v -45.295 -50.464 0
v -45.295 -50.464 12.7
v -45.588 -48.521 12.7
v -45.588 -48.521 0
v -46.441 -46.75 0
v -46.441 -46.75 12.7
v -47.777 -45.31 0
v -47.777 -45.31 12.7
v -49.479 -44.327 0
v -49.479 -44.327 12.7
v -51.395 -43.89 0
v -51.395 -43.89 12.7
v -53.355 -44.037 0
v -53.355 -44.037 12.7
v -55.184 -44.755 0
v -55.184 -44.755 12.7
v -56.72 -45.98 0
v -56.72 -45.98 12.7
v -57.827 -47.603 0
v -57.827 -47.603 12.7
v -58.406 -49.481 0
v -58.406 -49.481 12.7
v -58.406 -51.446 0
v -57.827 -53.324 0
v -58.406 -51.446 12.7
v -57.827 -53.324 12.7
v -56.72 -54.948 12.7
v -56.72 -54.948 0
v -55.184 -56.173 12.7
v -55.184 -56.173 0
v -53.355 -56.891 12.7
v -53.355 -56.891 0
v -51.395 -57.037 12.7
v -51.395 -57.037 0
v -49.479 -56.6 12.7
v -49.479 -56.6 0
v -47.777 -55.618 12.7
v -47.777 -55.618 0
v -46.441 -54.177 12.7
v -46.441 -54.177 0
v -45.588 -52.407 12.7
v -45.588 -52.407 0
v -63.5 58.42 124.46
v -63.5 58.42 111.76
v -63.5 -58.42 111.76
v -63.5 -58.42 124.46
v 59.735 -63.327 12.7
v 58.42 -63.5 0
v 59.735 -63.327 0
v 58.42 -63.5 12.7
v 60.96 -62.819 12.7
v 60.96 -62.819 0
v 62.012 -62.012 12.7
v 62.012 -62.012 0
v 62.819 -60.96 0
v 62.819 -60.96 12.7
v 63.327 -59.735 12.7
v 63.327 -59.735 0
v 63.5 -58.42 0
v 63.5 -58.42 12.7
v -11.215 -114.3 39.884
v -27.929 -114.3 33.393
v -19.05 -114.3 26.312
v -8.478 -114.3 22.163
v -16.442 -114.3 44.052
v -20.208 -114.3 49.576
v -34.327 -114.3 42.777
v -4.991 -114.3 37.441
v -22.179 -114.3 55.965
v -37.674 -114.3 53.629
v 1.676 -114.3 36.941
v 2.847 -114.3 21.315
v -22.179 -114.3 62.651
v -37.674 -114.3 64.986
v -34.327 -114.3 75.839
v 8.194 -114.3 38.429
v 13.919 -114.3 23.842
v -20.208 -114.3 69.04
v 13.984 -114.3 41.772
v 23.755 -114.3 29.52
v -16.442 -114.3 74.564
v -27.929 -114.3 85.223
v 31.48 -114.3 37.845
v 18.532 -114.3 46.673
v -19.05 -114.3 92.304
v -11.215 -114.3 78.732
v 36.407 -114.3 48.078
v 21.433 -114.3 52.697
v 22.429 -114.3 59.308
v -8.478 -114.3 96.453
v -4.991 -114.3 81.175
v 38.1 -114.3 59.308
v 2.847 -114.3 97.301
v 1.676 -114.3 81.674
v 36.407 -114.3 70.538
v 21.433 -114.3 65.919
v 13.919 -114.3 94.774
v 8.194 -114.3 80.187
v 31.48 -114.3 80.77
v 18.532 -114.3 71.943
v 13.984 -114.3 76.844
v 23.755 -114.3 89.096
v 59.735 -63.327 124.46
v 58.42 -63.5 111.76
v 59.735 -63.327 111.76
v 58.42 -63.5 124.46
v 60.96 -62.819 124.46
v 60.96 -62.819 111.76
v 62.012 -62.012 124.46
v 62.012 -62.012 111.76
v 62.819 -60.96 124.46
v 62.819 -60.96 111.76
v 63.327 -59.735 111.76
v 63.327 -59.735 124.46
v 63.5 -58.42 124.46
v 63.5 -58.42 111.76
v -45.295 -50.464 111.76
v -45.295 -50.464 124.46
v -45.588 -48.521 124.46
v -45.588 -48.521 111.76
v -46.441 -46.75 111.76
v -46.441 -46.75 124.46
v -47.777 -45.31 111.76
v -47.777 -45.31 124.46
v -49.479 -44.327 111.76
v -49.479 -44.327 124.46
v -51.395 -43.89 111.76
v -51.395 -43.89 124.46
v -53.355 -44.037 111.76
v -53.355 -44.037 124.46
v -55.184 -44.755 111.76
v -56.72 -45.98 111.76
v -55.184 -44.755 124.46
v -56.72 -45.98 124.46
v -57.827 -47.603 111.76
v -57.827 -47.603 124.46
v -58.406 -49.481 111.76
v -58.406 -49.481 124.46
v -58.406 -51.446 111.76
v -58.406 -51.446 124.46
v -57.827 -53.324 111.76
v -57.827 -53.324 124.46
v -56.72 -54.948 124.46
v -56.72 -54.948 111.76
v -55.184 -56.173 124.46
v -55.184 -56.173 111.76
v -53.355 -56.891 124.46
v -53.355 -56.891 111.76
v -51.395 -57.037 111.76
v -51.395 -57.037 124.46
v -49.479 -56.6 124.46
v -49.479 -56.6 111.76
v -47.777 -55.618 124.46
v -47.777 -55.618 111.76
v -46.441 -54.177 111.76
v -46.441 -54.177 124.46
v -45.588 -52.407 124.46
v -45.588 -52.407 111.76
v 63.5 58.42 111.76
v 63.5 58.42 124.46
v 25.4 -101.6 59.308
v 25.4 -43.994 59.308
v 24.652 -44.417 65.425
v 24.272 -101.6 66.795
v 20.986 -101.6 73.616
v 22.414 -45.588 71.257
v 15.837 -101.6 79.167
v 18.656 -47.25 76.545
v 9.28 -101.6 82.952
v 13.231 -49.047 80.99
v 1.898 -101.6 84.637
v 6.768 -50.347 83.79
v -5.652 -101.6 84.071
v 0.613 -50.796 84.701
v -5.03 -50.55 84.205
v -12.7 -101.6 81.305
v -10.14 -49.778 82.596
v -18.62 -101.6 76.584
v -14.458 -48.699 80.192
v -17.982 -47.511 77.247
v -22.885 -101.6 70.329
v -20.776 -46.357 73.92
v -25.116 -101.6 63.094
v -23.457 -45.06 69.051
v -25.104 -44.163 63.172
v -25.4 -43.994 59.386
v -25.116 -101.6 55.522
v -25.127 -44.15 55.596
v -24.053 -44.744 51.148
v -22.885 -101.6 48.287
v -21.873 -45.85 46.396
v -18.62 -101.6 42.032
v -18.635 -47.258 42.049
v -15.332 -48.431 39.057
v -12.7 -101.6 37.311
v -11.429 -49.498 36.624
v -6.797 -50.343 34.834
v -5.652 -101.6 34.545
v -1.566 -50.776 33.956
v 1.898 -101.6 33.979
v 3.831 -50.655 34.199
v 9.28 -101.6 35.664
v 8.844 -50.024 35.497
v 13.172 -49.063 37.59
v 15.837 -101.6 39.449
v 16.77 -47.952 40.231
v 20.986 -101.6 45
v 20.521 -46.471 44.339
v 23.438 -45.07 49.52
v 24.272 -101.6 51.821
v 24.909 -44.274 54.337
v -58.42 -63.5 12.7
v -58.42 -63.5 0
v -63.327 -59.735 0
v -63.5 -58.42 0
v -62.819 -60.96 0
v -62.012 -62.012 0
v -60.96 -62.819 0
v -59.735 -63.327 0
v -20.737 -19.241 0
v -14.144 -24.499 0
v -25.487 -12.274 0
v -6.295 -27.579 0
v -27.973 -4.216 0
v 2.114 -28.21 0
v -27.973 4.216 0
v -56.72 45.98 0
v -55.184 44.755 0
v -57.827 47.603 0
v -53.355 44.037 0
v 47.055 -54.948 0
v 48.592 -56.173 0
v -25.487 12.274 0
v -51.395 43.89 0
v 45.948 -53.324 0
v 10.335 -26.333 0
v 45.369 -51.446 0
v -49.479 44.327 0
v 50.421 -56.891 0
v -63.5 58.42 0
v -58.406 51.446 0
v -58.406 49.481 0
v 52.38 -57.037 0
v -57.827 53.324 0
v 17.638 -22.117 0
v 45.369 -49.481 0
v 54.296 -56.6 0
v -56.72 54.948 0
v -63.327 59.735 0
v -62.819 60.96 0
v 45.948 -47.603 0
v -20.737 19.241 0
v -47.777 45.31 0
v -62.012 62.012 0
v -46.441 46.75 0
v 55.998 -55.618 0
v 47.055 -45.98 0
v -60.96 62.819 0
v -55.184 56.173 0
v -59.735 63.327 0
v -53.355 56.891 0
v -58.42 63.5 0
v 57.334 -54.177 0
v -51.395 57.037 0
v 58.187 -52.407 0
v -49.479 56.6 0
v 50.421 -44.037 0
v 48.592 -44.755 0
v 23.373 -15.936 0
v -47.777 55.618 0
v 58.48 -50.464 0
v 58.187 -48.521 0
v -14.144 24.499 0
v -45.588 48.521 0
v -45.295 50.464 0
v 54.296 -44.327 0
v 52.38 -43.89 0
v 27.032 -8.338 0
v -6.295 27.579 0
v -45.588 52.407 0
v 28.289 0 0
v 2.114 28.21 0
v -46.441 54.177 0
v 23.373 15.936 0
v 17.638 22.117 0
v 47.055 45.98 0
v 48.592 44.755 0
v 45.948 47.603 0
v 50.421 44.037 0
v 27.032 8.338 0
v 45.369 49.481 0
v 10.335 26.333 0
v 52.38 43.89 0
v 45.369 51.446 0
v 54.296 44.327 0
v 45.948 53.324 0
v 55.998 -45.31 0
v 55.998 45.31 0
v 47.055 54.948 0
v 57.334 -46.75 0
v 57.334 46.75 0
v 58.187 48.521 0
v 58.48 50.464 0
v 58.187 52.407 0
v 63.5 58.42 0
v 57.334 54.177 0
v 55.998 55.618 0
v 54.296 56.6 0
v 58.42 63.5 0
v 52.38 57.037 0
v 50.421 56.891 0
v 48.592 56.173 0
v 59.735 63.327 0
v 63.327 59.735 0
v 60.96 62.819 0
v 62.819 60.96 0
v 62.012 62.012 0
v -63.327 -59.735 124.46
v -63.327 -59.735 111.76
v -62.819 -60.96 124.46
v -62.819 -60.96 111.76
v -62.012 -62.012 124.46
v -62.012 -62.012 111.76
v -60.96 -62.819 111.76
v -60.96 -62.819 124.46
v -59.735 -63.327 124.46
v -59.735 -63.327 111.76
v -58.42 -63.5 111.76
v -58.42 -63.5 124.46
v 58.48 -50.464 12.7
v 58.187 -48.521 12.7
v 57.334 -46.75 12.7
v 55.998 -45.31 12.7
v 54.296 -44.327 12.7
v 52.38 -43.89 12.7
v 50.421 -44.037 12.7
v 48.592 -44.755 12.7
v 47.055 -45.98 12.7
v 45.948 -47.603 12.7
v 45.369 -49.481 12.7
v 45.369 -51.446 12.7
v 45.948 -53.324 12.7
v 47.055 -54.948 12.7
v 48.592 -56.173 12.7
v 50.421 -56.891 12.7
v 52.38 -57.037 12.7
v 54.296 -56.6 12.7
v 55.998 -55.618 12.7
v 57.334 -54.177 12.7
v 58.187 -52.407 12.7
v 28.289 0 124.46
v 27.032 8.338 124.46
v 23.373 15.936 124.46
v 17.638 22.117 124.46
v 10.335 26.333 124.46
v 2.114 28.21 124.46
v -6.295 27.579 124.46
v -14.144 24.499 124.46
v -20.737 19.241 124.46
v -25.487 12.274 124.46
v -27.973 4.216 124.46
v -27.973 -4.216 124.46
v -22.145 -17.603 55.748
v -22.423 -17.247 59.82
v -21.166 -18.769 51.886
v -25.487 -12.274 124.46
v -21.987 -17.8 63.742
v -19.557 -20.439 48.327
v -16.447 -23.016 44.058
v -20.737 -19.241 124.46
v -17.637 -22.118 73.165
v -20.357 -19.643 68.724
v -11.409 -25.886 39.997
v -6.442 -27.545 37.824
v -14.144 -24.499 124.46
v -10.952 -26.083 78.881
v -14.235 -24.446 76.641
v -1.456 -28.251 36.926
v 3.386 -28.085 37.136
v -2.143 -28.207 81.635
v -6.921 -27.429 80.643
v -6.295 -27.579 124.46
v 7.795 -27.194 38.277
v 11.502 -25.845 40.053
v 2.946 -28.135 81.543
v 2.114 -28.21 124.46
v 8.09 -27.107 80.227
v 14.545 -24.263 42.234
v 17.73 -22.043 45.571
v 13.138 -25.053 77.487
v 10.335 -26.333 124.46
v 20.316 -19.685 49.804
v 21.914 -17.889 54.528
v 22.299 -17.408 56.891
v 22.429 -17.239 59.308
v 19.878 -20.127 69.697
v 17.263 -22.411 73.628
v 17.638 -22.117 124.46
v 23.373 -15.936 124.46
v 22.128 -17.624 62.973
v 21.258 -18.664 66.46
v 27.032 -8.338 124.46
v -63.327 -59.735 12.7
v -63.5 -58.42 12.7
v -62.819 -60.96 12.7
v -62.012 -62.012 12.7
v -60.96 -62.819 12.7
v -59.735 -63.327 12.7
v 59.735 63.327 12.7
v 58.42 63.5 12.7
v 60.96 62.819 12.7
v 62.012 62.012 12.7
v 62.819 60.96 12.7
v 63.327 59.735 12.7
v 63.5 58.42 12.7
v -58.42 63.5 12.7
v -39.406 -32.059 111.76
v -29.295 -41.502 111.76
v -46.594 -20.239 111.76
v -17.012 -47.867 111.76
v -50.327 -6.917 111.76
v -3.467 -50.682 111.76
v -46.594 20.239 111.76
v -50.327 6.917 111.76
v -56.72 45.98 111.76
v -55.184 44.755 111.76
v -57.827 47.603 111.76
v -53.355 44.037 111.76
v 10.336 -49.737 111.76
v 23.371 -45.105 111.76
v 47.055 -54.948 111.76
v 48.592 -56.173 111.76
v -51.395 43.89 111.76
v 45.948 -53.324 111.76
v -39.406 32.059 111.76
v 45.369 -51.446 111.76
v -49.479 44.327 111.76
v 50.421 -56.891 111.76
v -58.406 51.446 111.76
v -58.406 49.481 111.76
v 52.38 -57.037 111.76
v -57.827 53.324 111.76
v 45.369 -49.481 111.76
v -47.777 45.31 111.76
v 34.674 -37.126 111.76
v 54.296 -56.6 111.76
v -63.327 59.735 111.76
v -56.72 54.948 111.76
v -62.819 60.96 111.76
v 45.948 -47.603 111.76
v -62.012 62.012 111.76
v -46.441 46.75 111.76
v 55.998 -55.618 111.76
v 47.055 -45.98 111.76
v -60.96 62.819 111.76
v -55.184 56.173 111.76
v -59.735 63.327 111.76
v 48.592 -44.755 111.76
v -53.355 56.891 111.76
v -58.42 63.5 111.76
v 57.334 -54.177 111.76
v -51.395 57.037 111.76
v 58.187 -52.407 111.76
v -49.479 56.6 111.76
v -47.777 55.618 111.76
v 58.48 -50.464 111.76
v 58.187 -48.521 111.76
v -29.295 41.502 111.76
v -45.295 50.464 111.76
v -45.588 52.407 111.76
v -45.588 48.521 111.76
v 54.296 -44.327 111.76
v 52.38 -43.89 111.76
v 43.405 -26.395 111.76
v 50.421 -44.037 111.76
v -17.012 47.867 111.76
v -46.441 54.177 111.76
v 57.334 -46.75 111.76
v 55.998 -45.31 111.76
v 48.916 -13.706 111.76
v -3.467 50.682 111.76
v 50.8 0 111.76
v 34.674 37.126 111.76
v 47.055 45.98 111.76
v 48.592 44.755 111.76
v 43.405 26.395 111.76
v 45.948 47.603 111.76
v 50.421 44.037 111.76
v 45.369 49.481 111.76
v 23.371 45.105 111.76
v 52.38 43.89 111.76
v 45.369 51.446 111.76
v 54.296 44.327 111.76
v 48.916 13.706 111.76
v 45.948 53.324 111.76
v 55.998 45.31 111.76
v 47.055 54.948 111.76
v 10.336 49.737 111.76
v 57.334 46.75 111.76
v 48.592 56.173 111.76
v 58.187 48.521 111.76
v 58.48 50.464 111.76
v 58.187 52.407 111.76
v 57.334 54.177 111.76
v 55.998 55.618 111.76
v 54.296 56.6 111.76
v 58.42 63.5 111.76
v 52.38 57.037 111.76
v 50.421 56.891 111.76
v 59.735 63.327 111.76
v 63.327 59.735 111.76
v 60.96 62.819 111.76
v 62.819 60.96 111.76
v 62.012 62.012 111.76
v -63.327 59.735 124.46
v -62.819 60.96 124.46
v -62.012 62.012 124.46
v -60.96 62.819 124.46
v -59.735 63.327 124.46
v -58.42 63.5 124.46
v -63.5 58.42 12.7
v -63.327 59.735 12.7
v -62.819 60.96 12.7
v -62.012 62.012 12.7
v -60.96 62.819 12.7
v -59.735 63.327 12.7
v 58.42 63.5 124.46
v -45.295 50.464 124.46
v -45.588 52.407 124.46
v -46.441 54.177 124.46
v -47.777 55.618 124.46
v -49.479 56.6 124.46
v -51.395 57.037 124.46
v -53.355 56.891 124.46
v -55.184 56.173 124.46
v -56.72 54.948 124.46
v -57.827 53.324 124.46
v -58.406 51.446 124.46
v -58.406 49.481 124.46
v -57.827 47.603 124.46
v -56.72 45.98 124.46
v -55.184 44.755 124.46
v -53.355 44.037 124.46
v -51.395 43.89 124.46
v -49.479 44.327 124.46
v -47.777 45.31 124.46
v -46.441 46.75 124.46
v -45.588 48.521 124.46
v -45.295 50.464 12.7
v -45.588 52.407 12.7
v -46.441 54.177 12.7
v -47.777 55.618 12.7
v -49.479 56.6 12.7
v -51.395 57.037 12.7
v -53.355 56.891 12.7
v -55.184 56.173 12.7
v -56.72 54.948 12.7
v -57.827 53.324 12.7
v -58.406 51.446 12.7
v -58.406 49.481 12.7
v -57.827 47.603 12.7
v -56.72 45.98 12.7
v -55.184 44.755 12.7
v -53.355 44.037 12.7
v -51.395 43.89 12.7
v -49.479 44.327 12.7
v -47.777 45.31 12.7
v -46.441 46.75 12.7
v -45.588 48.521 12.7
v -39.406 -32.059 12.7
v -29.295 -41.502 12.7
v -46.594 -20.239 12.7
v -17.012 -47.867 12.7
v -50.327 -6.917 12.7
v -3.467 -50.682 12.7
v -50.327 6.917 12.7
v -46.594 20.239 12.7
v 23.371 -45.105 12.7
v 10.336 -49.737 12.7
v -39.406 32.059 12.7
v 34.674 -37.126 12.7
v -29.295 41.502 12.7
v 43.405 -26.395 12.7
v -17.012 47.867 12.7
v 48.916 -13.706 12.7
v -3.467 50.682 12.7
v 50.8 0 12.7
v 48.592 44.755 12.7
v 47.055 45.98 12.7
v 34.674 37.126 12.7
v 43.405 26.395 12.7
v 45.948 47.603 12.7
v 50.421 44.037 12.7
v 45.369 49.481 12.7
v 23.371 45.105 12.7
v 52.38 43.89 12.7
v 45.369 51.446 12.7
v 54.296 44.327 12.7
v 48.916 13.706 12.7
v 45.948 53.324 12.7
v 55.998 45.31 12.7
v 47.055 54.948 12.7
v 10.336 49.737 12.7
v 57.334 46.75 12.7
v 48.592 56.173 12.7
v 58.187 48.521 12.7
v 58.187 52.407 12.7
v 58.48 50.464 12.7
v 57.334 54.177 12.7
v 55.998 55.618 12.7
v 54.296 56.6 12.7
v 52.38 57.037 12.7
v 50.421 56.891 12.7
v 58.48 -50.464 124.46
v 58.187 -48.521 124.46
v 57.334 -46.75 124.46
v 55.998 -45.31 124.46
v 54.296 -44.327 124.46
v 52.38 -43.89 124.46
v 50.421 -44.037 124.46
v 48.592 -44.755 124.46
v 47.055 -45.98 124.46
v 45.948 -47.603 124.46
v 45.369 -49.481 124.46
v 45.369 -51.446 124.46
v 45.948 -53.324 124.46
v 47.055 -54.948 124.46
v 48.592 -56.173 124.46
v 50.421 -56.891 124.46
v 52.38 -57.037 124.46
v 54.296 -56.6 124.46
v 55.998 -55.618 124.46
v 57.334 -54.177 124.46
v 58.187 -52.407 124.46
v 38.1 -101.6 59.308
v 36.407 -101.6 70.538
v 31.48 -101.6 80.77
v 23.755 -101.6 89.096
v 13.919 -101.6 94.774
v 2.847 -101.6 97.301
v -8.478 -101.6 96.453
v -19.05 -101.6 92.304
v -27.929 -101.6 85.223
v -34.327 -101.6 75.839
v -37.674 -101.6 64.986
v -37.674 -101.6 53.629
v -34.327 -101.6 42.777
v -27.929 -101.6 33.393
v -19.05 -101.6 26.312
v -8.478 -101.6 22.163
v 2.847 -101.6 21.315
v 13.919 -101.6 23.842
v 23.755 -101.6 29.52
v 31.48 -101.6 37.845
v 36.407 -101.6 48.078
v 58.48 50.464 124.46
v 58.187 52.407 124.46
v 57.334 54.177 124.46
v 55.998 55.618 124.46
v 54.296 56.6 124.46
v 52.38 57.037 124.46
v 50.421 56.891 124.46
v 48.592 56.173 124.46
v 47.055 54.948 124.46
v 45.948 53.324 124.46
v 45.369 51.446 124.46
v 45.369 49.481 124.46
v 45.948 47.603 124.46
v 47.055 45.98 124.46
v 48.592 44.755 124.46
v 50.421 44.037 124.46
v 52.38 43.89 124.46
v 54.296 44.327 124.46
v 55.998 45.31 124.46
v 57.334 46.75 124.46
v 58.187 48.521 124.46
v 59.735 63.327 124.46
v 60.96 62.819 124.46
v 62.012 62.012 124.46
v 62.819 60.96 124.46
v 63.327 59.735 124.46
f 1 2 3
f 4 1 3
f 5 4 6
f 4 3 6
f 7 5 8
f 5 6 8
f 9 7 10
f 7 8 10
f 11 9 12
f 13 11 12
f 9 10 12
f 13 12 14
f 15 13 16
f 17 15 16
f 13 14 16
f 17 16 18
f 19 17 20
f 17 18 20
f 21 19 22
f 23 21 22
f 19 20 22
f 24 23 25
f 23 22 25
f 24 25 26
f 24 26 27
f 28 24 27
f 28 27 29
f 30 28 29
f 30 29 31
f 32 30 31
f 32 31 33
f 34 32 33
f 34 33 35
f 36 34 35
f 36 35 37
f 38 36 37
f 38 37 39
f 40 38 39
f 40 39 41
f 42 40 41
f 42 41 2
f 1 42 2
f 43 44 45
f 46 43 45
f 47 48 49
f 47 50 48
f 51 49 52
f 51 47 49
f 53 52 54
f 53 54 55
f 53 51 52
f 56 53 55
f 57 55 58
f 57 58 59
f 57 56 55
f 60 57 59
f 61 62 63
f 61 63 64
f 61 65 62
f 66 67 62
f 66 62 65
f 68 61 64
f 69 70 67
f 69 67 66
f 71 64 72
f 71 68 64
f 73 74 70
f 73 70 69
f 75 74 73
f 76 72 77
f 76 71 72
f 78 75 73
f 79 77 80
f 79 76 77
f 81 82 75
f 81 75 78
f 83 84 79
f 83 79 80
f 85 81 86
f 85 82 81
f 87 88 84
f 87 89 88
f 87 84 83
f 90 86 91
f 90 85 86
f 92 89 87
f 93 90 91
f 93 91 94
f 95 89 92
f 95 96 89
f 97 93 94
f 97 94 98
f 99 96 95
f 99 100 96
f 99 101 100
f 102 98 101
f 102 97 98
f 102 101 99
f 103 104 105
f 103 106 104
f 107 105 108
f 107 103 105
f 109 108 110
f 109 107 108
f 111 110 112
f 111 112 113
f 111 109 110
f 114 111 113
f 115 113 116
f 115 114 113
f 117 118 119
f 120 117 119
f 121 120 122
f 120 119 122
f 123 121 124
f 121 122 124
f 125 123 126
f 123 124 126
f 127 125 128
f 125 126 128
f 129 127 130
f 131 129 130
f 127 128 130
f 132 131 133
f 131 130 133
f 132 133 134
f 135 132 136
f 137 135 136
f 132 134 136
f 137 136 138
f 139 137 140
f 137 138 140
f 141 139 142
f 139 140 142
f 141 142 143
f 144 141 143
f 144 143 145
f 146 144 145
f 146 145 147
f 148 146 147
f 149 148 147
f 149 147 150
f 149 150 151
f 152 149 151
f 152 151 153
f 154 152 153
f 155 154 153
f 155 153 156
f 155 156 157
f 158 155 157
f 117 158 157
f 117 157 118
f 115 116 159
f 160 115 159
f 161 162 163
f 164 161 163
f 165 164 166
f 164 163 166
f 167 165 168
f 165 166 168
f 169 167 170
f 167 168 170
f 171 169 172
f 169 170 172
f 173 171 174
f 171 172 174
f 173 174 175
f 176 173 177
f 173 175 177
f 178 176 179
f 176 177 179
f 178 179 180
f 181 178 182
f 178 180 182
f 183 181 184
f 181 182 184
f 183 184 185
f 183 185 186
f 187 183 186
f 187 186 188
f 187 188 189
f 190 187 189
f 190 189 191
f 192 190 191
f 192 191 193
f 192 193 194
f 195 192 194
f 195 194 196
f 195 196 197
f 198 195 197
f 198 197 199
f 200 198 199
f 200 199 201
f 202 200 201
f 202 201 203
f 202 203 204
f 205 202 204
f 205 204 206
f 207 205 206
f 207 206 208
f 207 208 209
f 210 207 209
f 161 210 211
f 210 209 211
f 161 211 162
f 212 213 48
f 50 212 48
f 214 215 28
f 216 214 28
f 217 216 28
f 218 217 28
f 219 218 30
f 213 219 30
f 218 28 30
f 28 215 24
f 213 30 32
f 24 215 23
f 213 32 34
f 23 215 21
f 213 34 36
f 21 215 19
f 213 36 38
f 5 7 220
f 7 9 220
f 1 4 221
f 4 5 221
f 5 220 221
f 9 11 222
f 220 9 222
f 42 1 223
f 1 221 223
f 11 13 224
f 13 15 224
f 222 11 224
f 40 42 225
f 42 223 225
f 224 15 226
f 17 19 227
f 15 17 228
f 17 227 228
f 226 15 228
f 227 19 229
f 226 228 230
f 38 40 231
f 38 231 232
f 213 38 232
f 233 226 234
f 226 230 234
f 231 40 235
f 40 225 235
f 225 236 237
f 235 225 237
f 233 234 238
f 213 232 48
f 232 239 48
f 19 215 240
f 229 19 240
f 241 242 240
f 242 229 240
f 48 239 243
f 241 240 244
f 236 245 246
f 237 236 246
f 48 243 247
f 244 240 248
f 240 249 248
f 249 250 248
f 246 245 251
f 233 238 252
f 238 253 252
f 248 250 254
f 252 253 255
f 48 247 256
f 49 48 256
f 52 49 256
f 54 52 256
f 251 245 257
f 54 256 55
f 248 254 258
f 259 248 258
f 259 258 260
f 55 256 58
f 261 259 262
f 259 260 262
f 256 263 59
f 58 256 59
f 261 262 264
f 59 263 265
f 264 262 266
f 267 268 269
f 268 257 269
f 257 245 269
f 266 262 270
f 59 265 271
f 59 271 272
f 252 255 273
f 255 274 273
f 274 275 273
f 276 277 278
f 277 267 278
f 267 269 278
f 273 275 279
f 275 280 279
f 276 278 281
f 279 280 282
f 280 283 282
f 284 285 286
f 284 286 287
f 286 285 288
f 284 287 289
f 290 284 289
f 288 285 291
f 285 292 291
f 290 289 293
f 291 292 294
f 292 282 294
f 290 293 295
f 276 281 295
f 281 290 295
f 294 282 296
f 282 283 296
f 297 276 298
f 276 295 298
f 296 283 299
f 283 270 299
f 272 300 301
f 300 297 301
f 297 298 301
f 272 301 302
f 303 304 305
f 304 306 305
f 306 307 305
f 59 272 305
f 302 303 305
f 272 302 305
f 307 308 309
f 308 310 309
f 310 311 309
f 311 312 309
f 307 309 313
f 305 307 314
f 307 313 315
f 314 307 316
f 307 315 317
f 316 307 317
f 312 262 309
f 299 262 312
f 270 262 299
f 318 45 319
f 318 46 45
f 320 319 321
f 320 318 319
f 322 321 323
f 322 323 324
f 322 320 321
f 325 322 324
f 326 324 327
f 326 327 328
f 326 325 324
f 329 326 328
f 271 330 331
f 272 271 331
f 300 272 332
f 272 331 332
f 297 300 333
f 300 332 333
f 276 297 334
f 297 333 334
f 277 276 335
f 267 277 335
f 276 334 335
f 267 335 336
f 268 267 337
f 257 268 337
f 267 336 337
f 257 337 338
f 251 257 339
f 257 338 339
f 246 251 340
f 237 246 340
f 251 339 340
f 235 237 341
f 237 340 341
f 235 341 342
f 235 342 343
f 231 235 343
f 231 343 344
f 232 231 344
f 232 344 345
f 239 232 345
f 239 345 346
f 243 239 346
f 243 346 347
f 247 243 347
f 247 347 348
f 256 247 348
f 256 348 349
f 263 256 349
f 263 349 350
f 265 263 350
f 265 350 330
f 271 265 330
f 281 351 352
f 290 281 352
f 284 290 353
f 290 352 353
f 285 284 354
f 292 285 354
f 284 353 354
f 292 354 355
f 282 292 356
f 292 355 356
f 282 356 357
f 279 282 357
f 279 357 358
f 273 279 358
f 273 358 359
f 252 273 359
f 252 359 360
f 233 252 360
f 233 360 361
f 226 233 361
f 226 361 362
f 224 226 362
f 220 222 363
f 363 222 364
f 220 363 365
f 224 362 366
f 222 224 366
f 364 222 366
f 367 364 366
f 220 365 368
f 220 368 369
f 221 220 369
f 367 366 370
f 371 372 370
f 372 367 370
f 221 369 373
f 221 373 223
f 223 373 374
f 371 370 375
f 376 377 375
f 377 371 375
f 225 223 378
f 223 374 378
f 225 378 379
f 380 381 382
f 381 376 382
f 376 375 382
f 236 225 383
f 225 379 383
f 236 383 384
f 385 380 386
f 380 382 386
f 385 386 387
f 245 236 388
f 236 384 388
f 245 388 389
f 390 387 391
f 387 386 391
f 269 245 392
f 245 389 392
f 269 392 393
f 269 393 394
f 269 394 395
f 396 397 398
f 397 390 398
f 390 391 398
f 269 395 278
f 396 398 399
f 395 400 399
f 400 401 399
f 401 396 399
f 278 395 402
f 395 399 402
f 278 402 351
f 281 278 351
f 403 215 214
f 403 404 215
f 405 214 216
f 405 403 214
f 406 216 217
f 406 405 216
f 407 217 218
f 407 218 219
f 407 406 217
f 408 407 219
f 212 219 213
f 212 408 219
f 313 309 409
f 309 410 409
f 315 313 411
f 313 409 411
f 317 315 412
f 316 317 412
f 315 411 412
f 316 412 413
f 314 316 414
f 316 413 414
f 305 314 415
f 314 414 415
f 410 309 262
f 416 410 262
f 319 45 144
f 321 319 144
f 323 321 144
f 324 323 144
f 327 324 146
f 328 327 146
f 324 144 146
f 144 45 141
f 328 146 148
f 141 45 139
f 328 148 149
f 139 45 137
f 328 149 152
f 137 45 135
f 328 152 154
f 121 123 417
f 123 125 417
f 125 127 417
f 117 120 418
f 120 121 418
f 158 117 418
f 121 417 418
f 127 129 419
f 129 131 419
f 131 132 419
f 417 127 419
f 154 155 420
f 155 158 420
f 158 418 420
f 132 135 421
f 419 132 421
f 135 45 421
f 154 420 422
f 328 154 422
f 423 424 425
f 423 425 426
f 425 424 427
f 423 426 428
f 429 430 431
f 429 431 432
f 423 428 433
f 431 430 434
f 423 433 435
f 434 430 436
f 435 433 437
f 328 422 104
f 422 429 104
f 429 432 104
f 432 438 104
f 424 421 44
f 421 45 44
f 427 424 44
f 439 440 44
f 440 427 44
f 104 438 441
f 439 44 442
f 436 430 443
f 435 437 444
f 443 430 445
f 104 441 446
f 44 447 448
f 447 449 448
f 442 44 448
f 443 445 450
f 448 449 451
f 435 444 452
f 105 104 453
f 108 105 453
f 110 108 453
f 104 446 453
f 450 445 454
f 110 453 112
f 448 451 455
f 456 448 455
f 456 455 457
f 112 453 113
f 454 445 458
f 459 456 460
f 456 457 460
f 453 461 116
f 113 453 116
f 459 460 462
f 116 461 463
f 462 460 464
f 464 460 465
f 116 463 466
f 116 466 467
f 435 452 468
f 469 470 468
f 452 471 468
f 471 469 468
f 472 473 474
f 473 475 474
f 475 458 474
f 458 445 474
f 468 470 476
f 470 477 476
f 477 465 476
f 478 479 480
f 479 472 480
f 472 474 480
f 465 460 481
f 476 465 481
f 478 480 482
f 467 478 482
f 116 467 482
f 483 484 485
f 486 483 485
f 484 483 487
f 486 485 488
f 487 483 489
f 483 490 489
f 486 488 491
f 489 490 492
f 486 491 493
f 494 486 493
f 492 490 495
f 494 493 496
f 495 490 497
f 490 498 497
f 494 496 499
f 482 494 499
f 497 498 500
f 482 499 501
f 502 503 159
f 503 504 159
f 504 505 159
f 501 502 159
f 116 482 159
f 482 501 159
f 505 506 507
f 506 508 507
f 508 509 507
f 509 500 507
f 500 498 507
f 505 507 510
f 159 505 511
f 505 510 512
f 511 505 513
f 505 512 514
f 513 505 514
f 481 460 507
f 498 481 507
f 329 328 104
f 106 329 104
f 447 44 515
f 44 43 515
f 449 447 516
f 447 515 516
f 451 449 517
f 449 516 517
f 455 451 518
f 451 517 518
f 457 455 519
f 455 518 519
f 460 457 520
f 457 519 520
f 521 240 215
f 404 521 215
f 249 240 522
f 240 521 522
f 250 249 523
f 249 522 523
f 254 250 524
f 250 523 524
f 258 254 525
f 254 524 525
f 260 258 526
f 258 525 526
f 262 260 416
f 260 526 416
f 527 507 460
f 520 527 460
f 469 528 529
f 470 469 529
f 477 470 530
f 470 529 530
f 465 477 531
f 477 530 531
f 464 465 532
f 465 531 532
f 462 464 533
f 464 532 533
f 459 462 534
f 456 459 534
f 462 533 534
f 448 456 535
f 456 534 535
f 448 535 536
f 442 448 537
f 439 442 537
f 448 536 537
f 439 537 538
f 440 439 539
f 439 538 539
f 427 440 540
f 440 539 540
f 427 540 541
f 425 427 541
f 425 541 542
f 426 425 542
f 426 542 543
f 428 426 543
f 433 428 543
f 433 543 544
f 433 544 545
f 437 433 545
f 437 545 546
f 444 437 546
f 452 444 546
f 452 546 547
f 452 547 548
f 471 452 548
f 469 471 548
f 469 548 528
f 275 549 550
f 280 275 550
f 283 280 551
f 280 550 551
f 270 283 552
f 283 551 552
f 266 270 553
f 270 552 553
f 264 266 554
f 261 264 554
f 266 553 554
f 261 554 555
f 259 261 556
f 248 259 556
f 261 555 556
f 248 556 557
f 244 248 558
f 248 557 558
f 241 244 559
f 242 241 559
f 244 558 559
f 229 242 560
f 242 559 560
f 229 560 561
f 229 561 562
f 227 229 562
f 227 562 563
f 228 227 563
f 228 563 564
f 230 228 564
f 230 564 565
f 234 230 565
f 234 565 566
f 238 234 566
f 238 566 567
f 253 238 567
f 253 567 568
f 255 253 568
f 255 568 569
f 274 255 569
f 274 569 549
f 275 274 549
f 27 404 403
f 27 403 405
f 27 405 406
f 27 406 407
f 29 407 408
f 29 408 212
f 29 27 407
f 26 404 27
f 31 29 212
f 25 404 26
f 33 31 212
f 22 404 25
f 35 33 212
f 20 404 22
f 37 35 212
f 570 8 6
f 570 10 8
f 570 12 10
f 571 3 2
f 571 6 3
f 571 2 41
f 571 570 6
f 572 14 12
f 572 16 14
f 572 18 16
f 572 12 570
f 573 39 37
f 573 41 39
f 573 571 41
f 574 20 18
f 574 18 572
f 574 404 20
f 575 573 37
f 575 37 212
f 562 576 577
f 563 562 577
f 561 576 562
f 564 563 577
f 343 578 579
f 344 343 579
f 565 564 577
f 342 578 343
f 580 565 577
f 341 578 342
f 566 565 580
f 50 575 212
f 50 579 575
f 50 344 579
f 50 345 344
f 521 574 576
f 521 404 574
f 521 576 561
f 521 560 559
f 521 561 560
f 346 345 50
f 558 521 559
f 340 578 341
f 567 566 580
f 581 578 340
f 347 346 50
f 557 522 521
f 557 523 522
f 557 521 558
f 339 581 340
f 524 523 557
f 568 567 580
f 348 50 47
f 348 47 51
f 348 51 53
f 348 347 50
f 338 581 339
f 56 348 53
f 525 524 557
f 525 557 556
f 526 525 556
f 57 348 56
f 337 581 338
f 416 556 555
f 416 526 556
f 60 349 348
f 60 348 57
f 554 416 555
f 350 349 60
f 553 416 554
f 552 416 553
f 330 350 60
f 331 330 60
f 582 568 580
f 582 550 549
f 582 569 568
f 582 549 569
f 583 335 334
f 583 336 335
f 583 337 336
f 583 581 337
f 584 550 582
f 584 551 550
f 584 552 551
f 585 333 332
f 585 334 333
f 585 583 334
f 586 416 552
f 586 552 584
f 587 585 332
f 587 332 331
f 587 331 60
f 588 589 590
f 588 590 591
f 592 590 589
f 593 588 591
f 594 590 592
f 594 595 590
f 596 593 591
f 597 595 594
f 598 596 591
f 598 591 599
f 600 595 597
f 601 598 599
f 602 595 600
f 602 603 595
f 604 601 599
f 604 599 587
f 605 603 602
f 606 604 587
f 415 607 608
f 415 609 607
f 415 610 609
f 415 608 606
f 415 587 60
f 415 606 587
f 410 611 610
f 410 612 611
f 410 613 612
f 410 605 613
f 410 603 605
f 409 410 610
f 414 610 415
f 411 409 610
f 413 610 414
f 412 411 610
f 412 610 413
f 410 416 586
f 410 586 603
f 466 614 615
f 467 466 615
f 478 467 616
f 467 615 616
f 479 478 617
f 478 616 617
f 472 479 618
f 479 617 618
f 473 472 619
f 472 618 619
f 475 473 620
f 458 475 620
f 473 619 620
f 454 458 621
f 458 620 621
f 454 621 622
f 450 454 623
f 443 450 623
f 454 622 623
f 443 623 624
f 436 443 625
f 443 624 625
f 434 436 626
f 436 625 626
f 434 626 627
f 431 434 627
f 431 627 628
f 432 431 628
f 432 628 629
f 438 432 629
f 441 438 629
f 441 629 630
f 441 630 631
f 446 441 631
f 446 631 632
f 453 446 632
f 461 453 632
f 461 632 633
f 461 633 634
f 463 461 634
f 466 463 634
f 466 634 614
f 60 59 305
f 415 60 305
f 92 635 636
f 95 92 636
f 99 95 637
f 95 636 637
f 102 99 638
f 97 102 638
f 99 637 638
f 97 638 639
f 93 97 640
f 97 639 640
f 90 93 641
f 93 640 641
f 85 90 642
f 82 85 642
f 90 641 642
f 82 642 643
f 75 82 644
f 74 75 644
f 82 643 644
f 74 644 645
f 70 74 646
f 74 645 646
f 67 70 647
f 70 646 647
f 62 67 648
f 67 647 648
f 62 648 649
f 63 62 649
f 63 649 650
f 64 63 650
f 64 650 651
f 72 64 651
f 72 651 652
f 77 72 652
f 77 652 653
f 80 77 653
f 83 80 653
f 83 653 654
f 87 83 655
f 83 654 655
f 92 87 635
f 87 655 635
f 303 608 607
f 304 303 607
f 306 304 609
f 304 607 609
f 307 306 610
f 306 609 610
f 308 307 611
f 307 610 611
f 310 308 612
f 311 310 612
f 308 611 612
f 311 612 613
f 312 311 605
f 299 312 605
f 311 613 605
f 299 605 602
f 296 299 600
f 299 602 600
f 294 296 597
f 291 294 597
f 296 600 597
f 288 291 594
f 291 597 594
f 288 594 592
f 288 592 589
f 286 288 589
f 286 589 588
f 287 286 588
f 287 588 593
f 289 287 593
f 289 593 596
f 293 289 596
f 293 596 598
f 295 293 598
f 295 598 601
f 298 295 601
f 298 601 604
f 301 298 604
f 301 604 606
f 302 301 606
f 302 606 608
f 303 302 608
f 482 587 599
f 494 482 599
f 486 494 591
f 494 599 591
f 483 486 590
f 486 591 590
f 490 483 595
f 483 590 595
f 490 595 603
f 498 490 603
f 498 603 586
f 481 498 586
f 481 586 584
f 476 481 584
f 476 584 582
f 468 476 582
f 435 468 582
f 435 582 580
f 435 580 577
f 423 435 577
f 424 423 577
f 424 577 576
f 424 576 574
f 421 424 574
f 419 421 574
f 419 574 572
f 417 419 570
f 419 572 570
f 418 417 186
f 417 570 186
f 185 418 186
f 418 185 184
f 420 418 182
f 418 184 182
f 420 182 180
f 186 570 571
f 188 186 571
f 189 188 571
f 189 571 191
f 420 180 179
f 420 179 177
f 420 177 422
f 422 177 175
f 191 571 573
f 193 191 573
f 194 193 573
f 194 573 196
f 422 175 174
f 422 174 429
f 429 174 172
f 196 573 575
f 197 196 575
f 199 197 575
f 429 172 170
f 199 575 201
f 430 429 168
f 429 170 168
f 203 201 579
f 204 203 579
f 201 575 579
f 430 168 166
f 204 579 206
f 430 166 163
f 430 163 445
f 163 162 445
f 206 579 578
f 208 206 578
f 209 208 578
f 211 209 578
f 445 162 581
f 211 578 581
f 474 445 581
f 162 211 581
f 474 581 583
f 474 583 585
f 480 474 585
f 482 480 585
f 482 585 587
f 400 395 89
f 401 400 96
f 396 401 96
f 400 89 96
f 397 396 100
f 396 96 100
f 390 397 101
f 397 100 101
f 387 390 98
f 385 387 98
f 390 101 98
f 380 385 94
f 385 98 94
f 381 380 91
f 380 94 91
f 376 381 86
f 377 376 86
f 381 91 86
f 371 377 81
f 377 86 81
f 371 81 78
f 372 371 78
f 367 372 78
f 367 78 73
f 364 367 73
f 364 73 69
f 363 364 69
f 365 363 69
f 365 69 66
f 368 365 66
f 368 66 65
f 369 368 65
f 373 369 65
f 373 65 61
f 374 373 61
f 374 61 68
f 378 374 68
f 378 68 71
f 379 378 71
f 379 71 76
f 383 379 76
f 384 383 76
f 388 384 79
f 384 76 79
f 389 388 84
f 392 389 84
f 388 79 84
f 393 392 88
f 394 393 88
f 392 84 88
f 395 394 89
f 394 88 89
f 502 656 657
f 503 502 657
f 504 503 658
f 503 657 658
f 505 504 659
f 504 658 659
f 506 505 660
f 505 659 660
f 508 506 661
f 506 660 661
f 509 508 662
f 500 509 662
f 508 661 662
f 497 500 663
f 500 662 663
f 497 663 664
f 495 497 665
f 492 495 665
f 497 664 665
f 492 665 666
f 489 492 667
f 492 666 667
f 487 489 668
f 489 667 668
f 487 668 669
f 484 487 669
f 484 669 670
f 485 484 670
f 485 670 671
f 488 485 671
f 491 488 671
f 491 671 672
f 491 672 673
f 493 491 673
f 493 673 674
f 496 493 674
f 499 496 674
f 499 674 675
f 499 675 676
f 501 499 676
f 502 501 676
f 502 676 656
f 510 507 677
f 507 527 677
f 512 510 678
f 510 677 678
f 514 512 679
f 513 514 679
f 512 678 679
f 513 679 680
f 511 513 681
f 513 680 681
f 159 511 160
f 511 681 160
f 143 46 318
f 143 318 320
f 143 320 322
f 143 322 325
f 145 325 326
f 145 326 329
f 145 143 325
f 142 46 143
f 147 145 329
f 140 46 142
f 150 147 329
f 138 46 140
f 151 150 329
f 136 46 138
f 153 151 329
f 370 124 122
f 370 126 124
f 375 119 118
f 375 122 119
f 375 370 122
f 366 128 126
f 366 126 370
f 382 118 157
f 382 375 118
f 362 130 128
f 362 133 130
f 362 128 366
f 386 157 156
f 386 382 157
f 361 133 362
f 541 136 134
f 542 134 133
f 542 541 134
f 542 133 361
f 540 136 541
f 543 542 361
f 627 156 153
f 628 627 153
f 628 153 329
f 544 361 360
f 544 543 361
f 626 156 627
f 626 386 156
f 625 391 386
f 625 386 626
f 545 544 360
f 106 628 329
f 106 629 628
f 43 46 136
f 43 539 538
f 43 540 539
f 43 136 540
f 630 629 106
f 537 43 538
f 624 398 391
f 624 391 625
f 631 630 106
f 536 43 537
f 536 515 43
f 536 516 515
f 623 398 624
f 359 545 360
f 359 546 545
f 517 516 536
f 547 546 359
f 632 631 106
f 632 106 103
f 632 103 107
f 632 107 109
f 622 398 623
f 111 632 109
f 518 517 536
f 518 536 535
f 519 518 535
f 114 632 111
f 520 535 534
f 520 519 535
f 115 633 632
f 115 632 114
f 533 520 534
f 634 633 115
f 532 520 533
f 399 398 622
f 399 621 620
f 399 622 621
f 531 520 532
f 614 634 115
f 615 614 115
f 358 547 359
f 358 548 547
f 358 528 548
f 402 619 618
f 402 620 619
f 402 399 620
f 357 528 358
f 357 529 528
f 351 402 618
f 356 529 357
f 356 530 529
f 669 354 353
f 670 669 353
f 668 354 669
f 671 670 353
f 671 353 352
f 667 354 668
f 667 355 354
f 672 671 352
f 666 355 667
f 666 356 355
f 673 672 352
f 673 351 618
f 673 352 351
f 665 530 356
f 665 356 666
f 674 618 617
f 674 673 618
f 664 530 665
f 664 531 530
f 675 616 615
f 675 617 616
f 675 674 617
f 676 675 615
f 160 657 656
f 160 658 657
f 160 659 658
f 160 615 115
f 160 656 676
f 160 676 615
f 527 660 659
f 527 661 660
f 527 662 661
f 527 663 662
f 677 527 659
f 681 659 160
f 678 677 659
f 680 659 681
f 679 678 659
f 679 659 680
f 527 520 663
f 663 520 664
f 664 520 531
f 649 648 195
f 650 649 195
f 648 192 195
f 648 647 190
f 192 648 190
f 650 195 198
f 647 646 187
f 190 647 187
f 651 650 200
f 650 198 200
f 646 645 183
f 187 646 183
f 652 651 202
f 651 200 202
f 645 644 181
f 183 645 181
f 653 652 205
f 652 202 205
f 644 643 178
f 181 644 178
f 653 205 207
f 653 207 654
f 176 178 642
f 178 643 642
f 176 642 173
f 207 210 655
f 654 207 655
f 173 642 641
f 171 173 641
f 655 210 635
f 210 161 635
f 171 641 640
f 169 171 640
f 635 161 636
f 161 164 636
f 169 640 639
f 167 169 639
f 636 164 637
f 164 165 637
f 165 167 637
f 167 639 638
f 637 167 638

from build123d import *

# Parameters (mm, degrees)
F1_DEPTH  = 12.7
F2_R      = 50.8
F3_DEPTH  = 99.06
F5_DEPTH  = 12.7
F6_R      = 25.4
F7_DEPTH  = 101.6
F8_R      = 38.1
F9_DEPTH  = 12.7
F10_R     = 22.429205
F11_DEPTH = 101.6
F12_R     = 6.592238
F13_DEPTH = 124.461
F14_R     = 5.08
F15_R     = 28.288722
F16_DEPTH = 124.461


with BuildPart() as f1:
    # F0 (on Top) → F1 (new body)
    with BuildSketch(Plane.XY):
        Polygon((-63.5, 63.5), (-63.5, 0), (-63.5, -63.5), (0, -63.5), (63.5, -63.5), (63.5, 0), (63.5, 63.5), (0, 63.5), align=None)
    extrude(amount=F1_DEPTH)

    # F2 (on face) → F3 (join)
    with BuildSketch(Plane.XY.offset(12.7)):
        Circle(F2_R)
    extrude(amount=F3_DEPTH)

    # F4 (on face) → F5 (join)
    with BuildSketch(Plane.XY.offset(111.76)):
        Polygon((-63.5, 63.5), (-63.5, 0), (-63.5, -63.5), (0, -63.5), (63.5, -63.5), (63.5, 0), (63.5, 63.5), (0, 63.5), align=None)
    extrude(amount=F5_DEPTH)

    # F6 (on Front) → F7 (join)
    with BuildSketch(Plane.XZ):
        with Locations((0, 59.307985)):
            Circle(F6_R)
    extrude(amount=F7_DEPTH)

    # F8 (on face) → F9 (join)
    with BuildSketch(Plane.XZ.offset(101.6)):
        with Locations((0, 59.307985)):
            Circle(F8_R)
    extrude(amount=F9_DEPTH)

    # F10 (on face) → F11 (cut)
    with BuildSketch(Plane.XZ.offset(114.3)):
        with Locations((0, 59.307985)):
            Circle(F10_R)
    extrude(amount=-F11_DEPTH, mode=Mode.SUBTRACT)

    # F12 (on face) → F13 (cut, through all)
    with BuildSketch(Plane.XY.offset(124.46)):
        with Locations((-51.887672, 50.463643)):
            Circle(F12_R)
        with Locations((51.887672, 50.463643)):
            Circle(F12_R)
        with Locations((51.887672, -50.463643)):
            Circle(F12_R)
        with Locations((-51.887672, -50.463643)):
            Circle(F12_R)
    extrude(amount=-F13_DEPTH, mode=Mode.SUBTRACT)

    # F14
    f14_edges = [f1.edges().sort_by_distance(p)[0] for p in [
        (63.5, -63.5, 118.11),
        (63.5, 63.5, 118.11),
        (63.5, 63.5, 6.35),
        (63.5, -63.5, 6.35),
        (-63.5, -63.5, 118.11),
        (-63.5, -63.5, 6.35),
        (-63.5, 63.5, 118.11),
        (-63.5, 63.5, 6.35),
    ]]
    fillet(f14_edges, radius=F14_R)

    # F15 (on face) → F16 (cut, through all)
    with BuildSketch(Plane.XY.offset(124.46)):
        Circle(F15_R)
    extrude(amount=-F16_DEPTH, mode=Mode.SUBTRACT)


solid = f1.part
